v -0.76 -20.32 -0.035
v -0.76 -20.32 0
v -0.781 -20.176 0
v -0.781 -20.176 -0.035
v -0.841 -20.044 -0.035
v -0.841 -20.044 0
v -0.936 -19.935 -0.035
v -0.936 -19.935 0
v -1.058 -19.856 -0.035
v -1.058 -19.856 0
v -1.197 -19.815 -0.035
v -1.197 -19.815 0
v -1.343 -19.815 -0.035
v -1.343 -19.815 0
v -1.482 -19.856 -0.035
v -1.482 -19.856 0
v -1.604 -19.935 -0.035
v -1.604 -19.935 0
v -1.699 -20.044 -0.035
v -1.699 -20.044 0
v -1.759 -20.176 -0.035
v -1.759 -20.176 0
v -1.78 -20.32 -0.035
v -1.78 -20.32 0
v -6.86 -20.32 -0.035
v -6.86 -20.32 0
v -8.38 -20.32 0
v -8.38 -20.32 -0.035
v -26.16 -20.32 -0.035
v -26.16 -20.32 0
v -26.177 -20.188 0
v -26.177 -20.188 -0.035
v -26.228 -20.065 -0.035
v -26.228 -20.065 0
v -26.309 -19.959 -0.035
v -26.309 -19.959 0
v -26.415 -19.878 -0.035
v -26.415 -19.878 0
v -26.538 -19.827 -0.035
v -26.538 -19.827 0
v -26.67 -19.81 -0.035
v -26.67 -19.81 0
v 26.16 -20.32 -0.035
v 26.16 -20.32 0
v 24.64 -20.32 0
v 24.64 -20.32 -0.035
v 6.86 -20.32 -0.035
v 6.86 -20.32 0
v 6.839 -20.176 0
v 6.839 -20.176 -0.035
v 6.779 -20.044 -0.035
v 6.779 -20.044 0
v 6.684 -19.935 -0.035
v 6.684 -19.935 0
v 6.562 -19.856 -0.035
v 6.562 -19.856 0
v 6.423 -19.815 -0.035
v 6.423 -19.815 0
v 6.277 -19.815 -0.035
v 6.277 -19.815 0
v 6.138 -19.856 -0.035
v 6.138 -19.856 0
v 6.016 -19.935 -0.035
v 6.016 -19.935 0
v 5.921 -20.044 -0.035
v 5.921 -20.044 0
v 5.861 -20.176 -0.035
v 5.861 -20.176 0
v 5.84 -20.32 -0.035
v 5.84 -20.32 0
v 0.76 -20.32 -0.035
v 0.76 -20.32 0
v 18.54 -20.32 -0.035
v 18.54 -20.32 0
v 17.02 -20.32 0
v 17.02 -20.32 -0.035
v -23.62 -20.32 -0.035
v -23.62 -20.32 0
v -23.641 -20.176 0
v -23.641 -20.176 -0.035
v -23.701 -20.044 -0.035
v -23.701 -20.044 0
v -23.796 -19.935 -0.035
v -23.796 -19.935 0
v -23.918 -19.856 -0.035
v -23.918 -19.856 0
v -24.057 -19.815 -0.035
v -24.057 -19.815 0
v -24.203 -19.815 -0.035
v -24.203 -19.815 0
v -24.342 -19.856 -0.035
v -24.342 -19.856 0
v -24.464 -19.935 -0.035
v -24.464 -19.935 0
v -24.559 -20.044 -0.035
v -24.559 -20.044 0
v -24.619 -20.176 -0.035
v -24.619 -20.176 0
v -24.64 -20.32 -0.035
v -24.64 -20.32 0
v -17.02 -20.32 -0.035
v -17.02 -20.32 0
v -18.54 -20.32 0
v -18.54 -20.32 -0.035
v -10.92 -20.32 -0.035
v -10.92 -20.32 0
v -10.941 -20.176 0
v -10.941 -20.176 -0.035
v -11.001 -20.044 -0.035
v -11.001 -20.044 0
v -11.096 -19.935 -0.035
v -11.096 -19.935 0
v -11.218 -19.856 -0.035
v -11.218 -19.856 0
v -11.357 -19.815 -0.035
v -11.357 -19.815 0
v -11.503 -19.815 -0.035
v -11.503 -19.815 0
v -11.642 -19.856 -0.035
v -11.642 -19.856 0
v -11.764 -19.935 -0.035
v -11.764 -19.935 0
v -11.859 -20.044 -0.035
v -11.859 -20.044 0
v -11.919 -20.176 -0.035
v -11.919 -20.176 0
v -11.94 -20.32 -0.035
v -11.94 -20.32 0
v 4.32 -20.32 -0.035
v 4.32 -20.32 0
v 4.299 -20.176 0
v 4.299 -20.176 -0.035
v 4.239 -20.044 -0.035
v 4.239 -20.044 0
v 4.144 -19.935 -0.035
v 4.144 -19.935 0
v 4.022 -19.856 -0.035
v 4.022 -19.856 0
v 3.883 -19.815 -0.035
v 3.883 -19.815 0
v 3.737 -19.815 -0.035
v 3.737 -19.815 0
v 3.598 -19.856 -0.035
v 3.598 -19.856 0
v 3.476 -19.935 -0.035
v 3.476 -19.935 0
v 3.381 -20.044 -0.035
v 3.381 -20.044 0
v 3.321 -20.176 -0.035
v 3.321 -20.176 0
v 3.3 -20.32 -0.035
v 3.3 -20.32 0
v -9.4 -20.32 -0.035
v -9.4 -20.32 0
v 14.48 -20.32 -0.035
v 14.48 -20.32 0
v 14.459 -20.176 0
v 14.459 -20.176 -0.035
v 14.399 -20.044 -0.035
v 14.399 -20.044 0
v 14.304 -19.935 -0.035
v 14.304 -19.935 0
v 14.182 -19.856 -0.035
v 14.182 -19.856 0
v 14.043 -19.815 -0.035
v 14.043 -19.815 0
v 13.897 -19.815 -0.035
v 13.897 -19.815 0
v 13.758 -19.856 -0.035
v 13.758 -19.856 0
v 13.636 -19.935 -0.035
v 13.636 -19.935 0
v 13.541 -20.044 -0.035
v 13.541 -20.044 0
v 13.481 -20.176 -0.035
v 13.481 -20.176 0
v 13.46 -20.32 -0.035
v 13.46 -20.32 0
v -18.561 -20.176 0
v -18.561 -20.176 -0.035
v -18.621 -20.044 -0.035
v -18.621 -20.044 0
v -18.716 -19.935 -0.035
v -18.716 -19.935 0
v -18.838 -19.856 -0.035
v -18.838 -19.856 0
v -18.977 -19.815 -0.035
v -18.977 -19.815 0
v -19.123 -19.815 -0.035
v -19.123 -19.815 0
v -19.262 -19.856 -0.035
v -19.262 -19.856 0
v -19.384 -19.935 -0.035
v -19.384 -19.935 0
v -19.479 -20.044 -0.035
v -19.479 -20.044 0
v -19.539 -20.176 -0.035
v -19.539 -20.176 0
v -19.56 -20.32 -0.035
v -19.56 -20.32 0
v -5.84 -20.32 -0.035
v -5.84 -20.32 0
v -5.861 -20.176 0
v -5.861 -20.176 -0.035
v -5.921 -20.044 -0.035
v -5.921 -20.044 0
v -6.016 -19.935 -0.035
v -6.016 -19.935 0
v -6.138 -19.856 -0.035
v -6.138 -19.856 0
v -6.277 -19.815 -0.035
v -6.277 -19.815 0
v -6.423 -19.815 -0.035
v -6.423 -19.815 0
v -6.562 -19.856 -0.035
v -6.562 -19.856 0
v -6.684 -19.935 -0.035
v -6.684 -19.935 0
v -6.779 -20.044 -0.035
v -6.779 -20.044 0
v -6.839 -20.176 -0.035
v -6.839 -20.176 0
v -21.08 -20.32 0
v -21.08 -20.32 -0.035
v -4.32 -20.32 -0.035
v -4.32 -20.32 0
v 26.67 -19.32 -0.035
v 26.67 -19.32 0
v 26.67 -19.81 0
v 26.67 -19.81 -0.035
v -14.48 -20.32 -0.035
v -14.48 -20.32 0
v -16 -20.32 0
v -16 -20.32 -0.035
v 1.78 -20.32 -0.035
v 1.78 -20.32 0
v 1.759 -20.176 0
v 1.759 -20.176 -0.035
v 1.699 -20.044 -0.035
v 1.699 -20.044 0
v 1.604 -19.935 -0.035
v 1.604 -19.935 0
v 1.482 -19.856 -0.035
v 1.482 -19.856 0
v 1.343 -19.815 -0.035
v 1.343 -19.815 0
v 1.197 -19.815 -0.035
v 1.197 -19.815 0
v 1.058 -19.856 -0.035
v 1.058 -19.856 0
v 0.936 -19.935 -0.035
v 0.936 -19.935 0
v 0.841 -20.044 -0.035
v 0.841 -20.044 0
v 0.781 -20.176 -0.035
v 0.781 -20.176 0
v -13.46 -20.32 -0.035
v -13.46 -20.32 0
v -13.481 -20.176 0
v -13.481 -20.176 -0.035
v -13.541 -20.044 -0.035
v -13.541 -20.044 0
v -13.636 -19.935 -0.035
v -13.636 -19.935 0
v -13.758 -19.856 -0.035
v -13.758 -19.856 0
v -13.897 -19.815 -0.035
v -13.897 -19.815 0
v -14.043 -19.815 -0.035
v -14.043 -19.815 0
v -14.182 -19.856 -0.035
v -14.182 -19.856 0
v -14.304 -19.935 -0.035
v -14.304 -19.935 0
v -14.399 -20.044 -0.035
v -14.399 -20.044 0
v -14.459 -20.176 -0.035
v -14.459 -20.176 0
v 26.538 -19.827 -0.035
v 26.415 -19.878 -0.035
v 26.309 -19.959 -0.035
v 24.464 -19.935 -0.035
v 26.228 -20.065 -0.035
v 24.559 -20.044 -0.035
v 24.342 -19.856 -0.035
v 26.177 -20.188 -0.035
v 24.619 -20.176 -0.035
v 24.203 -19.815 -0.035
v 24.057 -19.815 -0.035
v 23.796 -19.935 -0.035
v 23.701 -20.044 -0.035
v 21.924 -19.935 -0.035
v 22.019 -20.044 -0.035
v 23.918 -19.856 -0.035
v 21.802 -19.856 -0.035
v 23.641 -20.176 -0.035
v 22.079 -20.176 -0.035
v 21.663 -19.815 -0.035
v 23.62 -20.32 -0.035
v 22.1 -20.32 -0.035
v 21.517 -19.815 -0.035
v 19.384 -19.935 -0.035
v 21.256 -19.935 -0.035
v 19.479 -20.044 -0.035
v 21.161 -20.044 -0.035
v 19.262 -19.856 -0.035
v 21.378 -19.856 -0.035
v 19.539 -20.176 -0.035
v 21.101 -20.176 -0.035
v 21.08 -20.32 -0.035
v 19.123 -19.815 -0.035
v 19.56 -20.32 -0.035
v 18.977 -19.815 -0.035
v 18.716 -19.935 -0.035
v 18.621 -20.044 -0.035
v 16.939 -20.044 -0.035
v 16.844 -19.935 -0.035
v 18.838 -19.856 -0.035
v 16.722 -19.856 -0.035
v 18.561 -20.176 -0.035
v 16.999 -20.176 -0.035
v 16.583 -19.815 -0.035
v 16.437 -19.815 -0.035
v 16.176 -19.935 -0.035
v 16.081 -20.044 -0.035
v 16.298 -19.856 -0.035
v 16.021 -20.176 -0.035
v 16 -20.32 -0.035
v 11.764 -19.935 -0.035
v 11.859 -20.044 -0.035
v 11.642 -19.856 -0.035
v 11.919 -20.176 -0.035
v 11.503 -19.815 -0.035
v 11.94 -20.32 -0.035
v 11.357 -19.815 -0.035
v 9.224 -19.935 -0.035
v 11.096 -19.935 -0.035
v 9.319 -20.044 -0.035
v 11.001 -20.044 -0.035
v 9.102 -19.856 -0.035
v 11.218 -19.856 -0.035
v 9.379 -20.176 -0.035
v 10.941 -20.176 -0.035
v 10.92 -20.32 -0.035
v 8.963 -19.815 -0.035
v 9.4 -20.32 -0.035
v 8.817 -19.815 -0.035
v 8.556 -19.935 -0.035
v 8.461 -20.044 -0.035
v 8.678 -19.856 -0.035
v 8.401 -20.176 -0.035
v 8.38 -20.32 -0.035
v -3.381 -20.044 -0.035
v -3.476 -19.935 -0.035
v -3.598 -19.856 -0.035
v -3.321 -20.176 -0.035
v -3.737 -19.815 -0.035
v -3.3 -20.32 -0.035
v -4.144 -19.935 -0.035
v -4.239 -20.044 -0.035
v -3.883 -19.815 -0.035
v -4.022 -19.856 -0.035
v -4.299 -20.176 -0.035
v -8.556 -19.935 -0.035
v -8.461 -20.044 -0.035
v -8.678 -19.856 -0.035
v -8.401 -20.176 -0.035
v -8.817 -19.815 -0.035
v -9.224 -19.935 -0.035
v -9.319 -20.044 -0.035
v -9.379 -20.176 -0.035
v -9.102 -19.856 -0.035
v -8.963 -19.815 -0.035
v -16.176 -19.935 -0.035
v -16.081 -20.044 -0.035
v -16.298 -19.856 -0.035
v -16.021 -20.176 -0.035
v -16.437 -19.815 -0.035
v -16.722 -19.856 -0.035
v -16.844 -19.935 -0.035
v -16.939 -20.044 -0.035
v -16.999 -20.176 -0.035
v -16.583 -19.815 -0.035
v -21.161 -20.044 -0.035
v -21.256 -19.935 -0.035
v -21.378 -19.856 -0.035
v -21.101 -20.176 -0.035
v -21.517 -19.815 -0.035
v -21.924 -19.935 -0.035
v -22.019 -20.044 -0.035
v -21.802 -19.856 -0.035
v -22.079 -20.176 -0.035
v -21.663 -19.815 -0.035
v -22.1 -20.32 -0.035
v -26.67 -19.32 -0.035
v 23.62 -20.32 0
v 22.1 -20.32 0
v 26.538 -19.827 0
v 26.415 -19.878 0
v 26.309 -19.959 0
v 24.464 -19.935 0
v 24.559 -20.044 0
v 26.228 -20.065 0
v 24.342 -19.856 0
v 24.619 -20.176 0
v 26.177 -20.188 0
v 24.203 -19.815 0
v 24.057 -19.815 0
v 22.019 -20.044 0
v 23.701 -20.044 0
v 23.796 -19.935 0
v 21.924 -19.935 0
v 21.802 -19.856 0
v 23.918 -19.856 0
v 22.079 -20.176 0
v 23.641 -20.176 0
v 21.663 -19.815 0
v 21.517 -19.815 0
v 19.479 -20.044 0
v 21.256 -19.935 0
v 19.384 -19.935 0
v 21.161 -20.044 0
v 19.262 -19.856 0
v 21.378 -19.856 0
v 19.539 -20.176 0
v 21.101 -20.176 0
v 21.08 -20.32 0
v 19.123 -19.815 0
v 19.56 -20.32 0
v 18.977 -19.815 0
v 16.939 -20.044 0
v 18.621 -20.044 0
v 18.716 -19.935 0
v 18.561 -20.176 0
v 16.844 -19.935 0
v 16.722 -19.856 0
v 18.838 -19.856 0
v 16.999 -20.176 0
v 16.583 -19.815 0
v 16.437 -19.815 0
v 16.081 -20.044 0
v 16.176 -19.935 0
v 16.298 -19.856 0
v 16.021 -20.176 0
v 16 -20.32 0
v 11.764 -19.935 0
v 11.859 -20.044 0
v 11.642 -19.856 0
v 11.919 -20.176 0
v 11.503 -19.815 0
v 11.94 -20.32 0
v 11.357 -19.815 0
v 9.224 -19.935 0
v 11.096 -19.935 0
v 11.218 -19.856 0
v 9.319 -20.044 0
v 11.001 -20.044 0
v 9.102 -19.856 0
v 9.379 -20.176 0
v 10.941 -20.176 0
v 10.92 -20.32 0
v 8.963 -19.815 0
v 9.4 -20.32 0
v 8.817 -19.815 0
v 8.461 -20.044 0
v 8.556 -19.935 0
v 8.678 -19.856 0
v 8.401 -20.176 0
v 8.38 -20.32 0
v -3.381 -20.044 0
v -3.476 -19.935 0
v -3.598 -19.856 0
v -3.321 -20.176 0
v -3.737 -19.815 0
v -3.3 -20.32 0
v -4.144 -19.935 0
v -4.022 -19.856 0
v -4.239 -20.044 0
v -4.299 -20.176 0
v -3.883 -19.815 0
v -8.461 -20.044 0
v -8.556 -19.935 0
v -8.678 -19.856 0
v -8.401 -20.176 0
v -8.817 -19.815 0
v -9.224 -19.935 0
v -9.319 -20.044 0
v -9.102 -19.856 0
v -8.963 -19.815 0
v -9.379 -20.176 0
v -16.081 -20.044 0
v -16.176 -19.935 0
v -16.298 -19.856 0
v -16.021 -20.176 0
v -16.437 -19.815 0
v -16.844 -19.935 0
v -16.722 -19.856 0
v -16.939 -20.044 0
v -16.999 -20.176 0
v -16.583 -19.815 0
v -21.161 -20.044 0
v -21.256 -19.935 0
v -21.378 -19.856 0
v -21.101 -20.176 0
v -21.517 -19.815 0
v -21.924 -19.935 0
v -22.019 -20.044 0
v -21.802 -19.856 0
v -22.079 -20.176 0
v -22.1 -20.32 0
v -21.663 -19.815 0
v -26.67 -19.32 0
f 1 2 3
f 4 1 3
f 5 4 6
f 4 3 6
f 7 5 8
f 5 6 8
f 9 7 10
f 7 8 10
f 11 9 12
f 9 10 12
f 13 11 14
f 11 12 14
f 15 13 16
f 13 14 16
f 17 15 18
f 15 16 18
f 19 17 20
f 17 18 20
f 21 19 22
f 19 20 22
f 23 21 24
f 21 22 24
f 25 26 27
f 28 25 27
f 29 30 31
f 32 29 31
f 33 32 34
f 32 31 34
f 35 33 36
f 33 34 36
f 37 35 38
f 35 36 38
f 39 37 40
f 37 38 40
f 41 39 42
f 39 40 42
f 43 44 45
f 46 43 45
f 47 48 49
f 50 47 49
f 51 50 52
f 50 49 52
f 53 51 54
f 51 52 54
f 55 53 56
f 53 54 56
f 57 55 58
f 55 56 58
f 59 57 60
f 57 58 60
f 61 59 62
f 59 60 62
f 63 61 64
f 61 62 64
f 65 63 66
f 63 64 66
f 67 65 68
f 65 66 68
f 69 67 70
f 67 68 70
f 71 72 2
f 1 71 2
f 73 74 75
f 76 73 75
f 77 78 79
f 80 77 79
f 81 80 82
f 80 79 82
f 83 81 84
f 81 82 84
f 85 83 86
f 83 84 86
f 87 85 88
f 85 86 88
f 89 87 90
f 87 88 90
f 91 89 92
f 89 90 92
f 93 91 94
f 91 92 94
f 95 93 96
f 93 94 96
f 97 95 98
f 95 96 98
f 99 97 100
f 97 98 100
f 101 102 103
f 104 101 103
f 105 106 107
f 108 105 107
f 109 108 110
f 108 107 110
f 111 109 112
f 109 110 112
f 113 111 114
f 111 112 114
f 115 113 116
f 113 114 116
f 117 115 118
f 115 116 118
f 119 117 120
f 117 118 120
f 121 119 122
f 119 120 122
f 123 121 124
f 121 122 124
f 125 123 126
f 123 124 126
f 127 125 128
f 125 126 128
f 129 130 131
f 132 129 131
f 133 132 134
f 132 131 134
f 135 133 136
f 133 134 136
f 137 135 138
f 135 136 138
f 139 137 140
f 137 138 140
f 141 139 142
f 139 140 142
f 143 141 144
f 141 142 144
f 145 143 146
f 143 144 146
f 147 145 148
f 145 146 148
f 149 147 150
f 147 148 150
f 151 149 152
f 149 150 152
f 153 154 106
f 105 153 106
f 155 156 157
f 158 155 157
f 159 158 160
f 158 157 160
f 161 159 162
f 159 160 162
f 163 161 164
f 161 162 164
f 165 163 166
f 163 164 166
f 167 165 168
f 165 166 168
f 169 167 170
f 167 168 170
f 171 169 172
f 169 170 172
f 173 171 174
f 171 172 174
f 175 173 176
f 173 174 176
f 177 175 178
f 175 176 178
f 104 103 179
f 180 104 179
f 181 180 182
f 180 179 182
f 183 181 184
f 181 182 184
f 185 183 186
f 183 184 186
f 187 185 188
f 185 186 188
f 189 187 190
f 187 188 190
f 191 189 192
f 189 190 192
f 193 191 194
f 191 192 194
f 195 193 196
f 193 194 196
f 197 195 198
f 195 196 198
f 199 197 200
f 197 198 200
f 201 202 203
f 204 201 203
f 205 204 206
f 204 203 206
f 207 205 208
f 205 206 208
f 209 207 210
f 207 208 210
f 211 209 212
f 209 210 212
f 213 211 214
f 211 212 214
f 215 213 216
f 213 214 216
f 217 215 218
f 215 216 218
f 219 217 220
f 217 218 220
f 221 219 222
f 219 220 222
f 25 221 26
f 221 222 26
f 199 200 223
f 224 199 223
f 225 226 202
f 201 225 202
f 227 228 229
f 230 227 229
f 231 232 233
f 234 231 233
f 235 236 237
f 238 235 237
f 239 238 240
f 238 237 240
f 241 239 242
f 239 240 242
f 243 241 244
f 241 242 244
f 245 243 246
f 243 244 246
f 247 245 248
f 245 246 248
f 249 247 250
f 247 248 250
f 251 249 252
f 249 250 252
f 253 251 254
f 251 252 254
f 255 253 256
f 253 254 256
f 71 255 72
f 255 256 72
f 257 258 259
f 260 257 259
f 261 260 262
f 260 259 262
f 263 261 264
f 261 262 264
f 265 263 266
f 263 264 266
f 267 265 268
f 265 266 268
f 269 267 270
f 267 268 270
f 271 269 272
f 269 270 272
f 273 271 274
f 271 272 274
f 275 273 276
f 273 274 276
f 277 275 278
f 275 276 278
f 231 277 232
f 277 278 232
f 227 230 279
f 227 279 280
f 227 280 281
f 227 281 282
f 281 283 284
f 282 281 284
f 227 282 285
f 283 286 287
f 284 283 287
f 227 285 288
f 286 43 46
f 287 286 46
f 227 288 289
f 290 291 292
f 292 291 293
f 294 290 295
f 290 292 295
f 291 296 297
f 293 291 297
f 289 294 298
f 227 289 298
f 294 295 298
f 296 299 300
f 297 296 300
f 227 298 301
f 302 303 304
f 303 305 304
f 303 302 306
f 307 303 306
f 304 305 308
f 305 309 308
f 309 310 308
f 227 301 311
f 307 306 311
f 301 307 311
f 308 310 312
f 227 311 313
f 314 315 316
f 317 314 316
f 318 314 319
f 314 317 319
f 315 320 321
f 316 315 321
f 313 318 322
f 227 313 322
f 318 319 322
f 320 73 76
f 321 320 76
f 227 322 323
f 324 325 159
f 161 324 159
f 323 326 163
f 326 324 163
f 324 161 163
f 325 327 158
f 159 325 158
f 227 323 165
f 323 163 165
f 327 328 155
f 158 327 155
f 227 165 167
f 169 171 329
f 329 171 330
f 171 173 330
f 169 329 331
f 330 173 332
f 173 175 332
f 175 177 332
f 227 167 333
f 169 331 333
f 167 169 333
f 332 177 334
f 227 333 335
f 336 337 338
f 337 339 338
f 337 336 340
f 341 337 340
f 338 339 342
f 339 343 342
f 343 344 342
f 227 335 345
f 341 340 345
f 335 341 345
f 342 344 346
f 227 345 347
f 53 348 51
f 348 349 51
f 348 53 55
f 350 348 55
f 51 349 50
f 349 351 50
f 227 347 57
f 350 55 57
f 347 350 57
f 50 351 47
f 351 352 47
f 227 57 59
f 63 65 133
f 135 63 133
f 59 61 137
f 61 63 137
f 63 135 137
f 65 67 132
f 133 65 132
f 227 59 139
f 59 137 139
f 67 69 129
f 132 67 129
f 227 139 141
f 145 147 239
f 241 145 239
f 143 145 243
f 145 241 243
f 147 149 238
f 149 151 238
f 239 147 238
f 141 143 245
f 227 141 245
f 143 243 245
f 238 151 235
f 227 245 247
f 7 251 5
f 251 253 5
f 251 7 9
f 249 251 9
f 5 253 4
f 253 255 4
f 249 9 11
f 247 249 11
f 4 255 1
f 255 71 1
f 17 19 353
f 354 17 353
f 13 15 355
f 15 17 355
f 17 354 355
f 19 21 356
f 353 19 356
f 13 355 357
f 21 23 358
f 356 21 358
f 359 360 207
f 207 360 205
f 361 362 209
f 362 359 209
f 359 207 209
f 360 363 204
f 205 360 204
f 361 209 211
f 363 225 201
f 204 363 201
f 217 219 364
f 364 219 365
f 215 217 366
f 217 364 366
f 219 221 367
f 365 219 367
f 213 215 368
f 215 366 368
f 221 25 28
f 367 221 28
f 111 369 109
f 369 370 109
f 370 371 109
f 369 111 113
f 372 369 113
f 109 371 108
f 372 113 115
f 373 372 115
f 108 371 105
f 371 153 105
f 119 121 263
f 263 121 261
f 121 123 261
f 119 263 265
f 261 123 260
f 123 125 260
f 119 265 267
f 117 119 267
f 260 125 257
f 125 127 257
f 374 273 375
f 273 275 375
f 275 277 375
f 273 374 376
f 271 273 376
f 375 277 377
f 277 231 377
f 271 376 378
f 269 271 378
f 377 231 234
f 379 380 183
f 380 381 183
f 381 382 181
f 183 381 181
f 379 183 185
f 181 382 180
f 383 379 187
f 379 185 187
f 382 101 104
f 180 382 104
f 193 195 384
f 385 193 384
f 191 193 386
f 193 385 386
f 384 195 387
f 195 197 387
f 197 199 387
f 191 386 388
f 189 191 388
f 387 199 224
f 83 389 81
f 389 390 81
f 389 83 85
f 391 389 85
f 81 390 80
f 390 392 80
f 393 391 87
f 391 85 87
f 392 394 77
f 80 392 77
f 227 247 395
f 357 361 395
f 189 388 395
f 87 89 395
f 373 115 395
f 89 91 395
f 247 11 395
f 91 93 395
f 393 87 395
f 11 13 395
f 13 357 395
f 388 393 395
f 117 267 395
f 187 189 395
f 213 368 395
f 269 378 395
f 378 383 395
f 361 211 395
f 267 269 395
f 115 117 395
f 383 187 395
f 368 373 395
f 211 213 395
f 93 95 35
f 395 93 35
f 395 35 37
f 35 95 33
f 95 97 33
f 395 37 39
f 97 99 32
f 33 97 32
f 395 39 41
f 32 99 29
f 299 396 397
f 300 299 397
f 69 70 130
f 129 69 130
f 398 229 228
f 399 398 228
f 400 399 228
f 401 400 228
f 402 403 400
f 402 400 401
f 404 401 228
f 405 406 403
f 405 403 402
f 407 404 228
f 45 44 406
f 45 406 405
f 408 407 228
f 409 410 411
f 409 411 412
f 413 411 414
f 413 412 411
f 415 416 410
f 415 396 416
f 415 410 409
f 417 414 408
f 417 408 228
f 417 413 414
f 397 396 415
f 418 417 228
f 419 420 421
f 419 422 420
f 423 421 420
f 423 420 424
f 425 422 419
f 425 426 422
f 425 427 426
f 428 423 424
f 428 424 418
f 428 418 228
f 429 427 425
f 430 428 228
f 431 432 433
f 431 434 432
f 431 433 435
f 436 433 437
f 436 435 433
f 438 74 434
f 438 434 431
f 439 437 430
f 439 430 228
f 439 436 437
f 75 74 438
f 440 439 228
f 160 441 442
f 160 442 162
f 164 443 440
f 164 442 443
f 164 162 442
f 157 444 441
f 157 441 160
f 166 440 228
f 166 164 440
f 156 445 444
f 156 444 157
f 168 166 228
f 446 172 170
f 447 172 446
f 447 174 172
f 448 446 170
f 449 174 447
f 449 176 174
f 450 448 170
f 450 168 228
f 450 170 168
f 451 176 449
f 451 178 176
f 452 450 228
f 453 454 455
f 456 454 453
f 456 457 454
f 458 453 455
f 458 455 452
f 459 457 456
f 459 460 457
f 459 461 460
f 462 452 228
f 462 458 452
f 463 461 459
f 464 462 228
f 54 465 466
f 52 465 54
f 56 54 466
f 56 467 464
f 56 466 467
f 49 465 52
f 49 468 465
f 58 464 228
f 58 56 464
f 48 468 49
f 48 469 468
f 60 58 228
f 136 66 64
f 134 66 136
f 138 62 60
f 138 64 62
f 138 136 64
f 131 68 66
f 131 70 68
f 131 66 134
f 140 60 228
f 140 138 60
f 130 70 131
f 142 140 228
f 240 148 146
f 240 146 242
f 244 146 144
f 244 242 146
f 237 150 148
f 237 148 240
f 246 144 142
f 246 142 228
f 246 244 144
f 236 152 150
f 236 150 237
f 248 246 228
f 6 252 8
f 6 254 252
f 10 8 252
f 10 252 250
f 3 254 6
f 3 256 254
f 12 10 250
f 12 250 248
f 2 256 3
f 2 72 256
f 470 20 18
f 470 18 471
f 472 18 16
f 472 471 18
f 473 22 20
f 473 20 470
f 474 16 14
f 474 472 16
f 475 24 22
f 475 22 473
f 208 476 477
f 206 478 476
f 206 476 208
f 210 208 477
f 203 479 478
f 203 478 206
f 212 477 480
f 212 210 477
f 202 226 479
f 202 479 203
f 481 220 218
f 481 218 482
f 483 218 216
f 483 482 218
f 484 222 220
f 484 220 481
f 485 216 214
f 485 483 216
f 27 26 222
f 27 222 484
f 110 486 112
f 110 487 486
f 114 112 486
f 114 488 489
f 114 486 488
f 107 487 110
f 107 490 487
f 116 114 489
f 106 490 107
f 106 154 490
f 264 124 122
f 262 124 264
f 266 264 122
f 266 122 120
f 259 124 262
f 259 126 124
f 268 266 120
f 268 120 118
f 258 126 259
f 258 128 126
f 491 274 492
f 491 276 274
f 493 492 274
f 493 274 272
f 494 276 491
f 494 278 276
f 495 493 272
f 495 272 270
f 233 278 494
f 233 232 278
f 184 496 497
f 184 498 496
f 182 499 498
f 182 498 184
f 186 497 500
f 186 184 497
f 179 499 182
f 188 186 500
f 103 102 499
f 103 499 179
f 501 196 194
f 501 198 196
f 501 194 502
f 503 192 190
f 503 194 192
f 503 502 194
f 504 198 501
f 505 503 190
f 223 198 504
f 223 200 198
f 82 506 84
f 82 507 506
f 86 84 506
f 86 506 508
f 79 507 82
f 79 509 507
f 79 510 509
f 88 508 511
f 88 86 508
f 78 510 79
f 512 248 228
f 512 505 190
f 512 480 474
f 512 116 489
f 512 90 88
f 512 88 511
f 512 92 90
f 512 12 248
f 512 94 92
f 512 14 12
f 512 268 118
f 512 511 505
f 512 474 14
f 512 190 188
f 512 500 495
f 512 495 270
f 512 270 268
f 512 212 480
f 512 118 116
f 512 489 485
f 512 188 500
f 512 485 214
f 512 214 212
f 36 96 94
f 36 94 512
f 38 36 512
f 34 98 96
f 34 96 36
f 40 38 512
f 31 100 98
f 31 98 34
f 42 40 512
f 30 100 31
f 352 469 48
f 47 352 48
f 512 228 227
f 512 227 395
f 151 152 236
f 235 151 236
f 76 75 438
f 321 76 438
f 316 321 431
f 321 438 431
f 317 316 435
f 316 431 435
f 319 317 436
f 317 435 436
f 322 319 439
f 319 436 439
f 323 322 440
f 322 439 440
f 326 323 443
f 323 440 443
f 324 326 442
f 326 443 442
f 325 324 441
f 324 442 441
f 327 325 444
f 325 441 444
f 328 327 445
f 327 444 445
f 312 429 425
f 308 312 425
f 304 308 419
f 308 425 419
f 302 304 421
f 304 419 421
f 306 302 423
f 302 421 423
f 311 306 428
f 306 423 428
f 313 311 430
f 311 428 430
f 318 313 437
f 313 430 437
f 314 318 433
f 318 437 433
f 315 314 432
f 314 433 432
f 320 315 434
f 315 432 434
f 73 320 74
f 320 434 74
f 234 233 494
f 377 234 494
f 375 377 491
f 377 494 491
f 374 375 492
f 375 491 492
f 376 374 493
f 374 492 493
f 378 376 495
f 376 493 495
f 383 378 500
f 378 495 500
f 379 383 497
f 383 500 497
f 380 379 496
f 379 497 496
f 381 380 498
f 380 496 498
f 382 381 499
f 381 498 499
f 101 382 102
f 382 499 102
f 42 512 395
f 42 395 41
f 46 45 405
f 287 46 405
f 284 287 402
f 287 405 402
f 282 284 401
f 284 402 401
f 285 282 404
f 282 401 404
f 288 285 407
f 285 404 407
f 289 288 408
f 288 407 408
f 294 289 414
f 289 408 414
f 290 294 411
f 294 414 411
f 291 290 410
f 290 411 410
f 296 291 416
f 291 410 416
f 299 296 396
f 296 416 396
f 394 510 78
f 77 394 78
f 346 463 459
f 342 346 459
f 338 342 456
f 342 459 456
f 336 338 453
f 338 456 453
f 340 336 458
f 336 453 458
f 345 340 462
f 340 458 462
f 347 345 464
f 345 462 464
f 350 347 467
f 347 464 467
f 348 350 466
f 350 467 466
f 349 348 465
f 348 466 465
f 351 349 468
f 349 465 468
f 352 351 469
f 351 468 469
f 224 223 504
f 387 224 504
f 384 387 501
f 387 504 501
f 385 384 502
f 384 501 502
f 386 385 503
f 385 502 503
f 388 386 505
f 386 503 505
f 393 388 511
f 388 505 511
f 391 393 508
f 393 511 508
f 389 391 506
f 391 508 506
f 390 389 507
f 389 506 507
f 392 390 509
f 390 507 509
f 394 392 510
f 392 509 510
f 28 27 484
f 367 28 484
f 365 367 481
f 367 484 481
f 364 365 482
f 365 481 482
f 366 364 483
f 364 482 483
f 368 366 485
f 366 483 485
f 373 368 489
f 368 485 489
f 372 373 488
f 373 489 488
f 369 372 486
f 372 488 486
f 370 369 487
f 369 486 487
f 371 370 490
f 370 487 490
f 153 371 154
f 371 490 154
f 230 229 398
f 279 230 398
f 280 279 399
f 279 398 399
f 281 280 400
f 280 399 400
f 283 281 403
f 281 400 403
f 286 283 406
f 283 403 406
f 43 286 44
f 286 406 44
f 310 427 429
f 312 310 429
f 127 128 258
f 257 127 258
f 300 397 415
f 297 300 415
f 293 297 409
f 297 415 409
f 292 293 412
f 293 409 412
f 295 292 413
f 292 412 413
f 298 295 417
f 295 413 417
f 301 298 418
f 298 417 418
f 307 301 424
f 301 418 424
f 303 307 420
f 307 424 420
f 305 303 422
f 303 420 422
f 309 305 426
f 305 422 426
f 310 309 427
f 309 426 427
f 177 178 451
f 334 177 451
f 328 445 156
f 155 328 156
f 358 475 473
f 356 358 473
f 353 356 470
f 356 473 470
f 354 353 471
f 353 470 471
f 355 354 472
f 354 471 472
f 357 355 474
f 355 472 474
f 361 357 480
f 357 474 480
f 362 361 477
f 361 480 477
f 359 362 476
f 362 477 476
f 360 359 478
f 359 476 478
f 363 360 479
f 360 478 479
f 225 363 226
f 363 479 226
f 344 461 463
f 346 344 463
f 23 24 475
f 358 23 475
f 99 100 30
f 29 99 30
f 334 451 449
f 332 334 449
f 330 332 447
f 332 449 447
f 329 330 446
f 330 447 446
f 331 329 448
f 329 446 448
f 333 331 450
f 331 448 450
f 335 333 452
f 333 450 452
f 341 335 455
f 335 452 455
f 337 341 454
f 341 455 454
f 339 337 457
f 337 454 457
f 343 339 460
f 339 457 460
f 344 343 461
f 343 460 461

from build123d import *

# Parameters (mm, degrees)
SKETCH004_W             = 53.34
SKETCH004_H             = 1
PAD002_DEPTH            = 0.035
SKETCH005_R             = 0.51
POCKET002_DEPTH         = 0.036
LINEARPATTERN005_COUNT  = 22
LINEARPATTERN005_PITCH  = 2.54
BODY004_PLACEMENT_ANGLE = 180


with BuildPart() as part:
    # Sketch004 → Pad002 (new body)
    with BuildSketch(Plane.XY):
        with Locations((0, 19.82)):
            Rectangle(SKETCH004_W, SKETCH004_H)
    extrude(amount=-PAD002_DEPTH)

    # Sketch005 → Pocket002 (cut, through all)
    with BuildSketch(Plane.XY):
        with Locations((-26.67, 20.32)):
            Circle(SKETCH005_R)
    pocket002 = extrude(amount=-POCKET002_DEPTH, mode=Mode.SUBTRACT)

    # LinearPattern005: Pocket002 ×22
    with Locations(*[(i * LINEARPATTERN005_PITCH, 0, 0) for i in range(1, LINEARPATTERN005_COUNT)]):
        add(pocket002, mode=Mode.SUBTRACT)


with BuildPart() as part_1:
    # Body004 placement: moved
    add(part.part.rotate(Axis((0, 0, 0), (0, 0, 1)), BODY004_PLACEMENT_ANGLE))


solid = part_1.part
